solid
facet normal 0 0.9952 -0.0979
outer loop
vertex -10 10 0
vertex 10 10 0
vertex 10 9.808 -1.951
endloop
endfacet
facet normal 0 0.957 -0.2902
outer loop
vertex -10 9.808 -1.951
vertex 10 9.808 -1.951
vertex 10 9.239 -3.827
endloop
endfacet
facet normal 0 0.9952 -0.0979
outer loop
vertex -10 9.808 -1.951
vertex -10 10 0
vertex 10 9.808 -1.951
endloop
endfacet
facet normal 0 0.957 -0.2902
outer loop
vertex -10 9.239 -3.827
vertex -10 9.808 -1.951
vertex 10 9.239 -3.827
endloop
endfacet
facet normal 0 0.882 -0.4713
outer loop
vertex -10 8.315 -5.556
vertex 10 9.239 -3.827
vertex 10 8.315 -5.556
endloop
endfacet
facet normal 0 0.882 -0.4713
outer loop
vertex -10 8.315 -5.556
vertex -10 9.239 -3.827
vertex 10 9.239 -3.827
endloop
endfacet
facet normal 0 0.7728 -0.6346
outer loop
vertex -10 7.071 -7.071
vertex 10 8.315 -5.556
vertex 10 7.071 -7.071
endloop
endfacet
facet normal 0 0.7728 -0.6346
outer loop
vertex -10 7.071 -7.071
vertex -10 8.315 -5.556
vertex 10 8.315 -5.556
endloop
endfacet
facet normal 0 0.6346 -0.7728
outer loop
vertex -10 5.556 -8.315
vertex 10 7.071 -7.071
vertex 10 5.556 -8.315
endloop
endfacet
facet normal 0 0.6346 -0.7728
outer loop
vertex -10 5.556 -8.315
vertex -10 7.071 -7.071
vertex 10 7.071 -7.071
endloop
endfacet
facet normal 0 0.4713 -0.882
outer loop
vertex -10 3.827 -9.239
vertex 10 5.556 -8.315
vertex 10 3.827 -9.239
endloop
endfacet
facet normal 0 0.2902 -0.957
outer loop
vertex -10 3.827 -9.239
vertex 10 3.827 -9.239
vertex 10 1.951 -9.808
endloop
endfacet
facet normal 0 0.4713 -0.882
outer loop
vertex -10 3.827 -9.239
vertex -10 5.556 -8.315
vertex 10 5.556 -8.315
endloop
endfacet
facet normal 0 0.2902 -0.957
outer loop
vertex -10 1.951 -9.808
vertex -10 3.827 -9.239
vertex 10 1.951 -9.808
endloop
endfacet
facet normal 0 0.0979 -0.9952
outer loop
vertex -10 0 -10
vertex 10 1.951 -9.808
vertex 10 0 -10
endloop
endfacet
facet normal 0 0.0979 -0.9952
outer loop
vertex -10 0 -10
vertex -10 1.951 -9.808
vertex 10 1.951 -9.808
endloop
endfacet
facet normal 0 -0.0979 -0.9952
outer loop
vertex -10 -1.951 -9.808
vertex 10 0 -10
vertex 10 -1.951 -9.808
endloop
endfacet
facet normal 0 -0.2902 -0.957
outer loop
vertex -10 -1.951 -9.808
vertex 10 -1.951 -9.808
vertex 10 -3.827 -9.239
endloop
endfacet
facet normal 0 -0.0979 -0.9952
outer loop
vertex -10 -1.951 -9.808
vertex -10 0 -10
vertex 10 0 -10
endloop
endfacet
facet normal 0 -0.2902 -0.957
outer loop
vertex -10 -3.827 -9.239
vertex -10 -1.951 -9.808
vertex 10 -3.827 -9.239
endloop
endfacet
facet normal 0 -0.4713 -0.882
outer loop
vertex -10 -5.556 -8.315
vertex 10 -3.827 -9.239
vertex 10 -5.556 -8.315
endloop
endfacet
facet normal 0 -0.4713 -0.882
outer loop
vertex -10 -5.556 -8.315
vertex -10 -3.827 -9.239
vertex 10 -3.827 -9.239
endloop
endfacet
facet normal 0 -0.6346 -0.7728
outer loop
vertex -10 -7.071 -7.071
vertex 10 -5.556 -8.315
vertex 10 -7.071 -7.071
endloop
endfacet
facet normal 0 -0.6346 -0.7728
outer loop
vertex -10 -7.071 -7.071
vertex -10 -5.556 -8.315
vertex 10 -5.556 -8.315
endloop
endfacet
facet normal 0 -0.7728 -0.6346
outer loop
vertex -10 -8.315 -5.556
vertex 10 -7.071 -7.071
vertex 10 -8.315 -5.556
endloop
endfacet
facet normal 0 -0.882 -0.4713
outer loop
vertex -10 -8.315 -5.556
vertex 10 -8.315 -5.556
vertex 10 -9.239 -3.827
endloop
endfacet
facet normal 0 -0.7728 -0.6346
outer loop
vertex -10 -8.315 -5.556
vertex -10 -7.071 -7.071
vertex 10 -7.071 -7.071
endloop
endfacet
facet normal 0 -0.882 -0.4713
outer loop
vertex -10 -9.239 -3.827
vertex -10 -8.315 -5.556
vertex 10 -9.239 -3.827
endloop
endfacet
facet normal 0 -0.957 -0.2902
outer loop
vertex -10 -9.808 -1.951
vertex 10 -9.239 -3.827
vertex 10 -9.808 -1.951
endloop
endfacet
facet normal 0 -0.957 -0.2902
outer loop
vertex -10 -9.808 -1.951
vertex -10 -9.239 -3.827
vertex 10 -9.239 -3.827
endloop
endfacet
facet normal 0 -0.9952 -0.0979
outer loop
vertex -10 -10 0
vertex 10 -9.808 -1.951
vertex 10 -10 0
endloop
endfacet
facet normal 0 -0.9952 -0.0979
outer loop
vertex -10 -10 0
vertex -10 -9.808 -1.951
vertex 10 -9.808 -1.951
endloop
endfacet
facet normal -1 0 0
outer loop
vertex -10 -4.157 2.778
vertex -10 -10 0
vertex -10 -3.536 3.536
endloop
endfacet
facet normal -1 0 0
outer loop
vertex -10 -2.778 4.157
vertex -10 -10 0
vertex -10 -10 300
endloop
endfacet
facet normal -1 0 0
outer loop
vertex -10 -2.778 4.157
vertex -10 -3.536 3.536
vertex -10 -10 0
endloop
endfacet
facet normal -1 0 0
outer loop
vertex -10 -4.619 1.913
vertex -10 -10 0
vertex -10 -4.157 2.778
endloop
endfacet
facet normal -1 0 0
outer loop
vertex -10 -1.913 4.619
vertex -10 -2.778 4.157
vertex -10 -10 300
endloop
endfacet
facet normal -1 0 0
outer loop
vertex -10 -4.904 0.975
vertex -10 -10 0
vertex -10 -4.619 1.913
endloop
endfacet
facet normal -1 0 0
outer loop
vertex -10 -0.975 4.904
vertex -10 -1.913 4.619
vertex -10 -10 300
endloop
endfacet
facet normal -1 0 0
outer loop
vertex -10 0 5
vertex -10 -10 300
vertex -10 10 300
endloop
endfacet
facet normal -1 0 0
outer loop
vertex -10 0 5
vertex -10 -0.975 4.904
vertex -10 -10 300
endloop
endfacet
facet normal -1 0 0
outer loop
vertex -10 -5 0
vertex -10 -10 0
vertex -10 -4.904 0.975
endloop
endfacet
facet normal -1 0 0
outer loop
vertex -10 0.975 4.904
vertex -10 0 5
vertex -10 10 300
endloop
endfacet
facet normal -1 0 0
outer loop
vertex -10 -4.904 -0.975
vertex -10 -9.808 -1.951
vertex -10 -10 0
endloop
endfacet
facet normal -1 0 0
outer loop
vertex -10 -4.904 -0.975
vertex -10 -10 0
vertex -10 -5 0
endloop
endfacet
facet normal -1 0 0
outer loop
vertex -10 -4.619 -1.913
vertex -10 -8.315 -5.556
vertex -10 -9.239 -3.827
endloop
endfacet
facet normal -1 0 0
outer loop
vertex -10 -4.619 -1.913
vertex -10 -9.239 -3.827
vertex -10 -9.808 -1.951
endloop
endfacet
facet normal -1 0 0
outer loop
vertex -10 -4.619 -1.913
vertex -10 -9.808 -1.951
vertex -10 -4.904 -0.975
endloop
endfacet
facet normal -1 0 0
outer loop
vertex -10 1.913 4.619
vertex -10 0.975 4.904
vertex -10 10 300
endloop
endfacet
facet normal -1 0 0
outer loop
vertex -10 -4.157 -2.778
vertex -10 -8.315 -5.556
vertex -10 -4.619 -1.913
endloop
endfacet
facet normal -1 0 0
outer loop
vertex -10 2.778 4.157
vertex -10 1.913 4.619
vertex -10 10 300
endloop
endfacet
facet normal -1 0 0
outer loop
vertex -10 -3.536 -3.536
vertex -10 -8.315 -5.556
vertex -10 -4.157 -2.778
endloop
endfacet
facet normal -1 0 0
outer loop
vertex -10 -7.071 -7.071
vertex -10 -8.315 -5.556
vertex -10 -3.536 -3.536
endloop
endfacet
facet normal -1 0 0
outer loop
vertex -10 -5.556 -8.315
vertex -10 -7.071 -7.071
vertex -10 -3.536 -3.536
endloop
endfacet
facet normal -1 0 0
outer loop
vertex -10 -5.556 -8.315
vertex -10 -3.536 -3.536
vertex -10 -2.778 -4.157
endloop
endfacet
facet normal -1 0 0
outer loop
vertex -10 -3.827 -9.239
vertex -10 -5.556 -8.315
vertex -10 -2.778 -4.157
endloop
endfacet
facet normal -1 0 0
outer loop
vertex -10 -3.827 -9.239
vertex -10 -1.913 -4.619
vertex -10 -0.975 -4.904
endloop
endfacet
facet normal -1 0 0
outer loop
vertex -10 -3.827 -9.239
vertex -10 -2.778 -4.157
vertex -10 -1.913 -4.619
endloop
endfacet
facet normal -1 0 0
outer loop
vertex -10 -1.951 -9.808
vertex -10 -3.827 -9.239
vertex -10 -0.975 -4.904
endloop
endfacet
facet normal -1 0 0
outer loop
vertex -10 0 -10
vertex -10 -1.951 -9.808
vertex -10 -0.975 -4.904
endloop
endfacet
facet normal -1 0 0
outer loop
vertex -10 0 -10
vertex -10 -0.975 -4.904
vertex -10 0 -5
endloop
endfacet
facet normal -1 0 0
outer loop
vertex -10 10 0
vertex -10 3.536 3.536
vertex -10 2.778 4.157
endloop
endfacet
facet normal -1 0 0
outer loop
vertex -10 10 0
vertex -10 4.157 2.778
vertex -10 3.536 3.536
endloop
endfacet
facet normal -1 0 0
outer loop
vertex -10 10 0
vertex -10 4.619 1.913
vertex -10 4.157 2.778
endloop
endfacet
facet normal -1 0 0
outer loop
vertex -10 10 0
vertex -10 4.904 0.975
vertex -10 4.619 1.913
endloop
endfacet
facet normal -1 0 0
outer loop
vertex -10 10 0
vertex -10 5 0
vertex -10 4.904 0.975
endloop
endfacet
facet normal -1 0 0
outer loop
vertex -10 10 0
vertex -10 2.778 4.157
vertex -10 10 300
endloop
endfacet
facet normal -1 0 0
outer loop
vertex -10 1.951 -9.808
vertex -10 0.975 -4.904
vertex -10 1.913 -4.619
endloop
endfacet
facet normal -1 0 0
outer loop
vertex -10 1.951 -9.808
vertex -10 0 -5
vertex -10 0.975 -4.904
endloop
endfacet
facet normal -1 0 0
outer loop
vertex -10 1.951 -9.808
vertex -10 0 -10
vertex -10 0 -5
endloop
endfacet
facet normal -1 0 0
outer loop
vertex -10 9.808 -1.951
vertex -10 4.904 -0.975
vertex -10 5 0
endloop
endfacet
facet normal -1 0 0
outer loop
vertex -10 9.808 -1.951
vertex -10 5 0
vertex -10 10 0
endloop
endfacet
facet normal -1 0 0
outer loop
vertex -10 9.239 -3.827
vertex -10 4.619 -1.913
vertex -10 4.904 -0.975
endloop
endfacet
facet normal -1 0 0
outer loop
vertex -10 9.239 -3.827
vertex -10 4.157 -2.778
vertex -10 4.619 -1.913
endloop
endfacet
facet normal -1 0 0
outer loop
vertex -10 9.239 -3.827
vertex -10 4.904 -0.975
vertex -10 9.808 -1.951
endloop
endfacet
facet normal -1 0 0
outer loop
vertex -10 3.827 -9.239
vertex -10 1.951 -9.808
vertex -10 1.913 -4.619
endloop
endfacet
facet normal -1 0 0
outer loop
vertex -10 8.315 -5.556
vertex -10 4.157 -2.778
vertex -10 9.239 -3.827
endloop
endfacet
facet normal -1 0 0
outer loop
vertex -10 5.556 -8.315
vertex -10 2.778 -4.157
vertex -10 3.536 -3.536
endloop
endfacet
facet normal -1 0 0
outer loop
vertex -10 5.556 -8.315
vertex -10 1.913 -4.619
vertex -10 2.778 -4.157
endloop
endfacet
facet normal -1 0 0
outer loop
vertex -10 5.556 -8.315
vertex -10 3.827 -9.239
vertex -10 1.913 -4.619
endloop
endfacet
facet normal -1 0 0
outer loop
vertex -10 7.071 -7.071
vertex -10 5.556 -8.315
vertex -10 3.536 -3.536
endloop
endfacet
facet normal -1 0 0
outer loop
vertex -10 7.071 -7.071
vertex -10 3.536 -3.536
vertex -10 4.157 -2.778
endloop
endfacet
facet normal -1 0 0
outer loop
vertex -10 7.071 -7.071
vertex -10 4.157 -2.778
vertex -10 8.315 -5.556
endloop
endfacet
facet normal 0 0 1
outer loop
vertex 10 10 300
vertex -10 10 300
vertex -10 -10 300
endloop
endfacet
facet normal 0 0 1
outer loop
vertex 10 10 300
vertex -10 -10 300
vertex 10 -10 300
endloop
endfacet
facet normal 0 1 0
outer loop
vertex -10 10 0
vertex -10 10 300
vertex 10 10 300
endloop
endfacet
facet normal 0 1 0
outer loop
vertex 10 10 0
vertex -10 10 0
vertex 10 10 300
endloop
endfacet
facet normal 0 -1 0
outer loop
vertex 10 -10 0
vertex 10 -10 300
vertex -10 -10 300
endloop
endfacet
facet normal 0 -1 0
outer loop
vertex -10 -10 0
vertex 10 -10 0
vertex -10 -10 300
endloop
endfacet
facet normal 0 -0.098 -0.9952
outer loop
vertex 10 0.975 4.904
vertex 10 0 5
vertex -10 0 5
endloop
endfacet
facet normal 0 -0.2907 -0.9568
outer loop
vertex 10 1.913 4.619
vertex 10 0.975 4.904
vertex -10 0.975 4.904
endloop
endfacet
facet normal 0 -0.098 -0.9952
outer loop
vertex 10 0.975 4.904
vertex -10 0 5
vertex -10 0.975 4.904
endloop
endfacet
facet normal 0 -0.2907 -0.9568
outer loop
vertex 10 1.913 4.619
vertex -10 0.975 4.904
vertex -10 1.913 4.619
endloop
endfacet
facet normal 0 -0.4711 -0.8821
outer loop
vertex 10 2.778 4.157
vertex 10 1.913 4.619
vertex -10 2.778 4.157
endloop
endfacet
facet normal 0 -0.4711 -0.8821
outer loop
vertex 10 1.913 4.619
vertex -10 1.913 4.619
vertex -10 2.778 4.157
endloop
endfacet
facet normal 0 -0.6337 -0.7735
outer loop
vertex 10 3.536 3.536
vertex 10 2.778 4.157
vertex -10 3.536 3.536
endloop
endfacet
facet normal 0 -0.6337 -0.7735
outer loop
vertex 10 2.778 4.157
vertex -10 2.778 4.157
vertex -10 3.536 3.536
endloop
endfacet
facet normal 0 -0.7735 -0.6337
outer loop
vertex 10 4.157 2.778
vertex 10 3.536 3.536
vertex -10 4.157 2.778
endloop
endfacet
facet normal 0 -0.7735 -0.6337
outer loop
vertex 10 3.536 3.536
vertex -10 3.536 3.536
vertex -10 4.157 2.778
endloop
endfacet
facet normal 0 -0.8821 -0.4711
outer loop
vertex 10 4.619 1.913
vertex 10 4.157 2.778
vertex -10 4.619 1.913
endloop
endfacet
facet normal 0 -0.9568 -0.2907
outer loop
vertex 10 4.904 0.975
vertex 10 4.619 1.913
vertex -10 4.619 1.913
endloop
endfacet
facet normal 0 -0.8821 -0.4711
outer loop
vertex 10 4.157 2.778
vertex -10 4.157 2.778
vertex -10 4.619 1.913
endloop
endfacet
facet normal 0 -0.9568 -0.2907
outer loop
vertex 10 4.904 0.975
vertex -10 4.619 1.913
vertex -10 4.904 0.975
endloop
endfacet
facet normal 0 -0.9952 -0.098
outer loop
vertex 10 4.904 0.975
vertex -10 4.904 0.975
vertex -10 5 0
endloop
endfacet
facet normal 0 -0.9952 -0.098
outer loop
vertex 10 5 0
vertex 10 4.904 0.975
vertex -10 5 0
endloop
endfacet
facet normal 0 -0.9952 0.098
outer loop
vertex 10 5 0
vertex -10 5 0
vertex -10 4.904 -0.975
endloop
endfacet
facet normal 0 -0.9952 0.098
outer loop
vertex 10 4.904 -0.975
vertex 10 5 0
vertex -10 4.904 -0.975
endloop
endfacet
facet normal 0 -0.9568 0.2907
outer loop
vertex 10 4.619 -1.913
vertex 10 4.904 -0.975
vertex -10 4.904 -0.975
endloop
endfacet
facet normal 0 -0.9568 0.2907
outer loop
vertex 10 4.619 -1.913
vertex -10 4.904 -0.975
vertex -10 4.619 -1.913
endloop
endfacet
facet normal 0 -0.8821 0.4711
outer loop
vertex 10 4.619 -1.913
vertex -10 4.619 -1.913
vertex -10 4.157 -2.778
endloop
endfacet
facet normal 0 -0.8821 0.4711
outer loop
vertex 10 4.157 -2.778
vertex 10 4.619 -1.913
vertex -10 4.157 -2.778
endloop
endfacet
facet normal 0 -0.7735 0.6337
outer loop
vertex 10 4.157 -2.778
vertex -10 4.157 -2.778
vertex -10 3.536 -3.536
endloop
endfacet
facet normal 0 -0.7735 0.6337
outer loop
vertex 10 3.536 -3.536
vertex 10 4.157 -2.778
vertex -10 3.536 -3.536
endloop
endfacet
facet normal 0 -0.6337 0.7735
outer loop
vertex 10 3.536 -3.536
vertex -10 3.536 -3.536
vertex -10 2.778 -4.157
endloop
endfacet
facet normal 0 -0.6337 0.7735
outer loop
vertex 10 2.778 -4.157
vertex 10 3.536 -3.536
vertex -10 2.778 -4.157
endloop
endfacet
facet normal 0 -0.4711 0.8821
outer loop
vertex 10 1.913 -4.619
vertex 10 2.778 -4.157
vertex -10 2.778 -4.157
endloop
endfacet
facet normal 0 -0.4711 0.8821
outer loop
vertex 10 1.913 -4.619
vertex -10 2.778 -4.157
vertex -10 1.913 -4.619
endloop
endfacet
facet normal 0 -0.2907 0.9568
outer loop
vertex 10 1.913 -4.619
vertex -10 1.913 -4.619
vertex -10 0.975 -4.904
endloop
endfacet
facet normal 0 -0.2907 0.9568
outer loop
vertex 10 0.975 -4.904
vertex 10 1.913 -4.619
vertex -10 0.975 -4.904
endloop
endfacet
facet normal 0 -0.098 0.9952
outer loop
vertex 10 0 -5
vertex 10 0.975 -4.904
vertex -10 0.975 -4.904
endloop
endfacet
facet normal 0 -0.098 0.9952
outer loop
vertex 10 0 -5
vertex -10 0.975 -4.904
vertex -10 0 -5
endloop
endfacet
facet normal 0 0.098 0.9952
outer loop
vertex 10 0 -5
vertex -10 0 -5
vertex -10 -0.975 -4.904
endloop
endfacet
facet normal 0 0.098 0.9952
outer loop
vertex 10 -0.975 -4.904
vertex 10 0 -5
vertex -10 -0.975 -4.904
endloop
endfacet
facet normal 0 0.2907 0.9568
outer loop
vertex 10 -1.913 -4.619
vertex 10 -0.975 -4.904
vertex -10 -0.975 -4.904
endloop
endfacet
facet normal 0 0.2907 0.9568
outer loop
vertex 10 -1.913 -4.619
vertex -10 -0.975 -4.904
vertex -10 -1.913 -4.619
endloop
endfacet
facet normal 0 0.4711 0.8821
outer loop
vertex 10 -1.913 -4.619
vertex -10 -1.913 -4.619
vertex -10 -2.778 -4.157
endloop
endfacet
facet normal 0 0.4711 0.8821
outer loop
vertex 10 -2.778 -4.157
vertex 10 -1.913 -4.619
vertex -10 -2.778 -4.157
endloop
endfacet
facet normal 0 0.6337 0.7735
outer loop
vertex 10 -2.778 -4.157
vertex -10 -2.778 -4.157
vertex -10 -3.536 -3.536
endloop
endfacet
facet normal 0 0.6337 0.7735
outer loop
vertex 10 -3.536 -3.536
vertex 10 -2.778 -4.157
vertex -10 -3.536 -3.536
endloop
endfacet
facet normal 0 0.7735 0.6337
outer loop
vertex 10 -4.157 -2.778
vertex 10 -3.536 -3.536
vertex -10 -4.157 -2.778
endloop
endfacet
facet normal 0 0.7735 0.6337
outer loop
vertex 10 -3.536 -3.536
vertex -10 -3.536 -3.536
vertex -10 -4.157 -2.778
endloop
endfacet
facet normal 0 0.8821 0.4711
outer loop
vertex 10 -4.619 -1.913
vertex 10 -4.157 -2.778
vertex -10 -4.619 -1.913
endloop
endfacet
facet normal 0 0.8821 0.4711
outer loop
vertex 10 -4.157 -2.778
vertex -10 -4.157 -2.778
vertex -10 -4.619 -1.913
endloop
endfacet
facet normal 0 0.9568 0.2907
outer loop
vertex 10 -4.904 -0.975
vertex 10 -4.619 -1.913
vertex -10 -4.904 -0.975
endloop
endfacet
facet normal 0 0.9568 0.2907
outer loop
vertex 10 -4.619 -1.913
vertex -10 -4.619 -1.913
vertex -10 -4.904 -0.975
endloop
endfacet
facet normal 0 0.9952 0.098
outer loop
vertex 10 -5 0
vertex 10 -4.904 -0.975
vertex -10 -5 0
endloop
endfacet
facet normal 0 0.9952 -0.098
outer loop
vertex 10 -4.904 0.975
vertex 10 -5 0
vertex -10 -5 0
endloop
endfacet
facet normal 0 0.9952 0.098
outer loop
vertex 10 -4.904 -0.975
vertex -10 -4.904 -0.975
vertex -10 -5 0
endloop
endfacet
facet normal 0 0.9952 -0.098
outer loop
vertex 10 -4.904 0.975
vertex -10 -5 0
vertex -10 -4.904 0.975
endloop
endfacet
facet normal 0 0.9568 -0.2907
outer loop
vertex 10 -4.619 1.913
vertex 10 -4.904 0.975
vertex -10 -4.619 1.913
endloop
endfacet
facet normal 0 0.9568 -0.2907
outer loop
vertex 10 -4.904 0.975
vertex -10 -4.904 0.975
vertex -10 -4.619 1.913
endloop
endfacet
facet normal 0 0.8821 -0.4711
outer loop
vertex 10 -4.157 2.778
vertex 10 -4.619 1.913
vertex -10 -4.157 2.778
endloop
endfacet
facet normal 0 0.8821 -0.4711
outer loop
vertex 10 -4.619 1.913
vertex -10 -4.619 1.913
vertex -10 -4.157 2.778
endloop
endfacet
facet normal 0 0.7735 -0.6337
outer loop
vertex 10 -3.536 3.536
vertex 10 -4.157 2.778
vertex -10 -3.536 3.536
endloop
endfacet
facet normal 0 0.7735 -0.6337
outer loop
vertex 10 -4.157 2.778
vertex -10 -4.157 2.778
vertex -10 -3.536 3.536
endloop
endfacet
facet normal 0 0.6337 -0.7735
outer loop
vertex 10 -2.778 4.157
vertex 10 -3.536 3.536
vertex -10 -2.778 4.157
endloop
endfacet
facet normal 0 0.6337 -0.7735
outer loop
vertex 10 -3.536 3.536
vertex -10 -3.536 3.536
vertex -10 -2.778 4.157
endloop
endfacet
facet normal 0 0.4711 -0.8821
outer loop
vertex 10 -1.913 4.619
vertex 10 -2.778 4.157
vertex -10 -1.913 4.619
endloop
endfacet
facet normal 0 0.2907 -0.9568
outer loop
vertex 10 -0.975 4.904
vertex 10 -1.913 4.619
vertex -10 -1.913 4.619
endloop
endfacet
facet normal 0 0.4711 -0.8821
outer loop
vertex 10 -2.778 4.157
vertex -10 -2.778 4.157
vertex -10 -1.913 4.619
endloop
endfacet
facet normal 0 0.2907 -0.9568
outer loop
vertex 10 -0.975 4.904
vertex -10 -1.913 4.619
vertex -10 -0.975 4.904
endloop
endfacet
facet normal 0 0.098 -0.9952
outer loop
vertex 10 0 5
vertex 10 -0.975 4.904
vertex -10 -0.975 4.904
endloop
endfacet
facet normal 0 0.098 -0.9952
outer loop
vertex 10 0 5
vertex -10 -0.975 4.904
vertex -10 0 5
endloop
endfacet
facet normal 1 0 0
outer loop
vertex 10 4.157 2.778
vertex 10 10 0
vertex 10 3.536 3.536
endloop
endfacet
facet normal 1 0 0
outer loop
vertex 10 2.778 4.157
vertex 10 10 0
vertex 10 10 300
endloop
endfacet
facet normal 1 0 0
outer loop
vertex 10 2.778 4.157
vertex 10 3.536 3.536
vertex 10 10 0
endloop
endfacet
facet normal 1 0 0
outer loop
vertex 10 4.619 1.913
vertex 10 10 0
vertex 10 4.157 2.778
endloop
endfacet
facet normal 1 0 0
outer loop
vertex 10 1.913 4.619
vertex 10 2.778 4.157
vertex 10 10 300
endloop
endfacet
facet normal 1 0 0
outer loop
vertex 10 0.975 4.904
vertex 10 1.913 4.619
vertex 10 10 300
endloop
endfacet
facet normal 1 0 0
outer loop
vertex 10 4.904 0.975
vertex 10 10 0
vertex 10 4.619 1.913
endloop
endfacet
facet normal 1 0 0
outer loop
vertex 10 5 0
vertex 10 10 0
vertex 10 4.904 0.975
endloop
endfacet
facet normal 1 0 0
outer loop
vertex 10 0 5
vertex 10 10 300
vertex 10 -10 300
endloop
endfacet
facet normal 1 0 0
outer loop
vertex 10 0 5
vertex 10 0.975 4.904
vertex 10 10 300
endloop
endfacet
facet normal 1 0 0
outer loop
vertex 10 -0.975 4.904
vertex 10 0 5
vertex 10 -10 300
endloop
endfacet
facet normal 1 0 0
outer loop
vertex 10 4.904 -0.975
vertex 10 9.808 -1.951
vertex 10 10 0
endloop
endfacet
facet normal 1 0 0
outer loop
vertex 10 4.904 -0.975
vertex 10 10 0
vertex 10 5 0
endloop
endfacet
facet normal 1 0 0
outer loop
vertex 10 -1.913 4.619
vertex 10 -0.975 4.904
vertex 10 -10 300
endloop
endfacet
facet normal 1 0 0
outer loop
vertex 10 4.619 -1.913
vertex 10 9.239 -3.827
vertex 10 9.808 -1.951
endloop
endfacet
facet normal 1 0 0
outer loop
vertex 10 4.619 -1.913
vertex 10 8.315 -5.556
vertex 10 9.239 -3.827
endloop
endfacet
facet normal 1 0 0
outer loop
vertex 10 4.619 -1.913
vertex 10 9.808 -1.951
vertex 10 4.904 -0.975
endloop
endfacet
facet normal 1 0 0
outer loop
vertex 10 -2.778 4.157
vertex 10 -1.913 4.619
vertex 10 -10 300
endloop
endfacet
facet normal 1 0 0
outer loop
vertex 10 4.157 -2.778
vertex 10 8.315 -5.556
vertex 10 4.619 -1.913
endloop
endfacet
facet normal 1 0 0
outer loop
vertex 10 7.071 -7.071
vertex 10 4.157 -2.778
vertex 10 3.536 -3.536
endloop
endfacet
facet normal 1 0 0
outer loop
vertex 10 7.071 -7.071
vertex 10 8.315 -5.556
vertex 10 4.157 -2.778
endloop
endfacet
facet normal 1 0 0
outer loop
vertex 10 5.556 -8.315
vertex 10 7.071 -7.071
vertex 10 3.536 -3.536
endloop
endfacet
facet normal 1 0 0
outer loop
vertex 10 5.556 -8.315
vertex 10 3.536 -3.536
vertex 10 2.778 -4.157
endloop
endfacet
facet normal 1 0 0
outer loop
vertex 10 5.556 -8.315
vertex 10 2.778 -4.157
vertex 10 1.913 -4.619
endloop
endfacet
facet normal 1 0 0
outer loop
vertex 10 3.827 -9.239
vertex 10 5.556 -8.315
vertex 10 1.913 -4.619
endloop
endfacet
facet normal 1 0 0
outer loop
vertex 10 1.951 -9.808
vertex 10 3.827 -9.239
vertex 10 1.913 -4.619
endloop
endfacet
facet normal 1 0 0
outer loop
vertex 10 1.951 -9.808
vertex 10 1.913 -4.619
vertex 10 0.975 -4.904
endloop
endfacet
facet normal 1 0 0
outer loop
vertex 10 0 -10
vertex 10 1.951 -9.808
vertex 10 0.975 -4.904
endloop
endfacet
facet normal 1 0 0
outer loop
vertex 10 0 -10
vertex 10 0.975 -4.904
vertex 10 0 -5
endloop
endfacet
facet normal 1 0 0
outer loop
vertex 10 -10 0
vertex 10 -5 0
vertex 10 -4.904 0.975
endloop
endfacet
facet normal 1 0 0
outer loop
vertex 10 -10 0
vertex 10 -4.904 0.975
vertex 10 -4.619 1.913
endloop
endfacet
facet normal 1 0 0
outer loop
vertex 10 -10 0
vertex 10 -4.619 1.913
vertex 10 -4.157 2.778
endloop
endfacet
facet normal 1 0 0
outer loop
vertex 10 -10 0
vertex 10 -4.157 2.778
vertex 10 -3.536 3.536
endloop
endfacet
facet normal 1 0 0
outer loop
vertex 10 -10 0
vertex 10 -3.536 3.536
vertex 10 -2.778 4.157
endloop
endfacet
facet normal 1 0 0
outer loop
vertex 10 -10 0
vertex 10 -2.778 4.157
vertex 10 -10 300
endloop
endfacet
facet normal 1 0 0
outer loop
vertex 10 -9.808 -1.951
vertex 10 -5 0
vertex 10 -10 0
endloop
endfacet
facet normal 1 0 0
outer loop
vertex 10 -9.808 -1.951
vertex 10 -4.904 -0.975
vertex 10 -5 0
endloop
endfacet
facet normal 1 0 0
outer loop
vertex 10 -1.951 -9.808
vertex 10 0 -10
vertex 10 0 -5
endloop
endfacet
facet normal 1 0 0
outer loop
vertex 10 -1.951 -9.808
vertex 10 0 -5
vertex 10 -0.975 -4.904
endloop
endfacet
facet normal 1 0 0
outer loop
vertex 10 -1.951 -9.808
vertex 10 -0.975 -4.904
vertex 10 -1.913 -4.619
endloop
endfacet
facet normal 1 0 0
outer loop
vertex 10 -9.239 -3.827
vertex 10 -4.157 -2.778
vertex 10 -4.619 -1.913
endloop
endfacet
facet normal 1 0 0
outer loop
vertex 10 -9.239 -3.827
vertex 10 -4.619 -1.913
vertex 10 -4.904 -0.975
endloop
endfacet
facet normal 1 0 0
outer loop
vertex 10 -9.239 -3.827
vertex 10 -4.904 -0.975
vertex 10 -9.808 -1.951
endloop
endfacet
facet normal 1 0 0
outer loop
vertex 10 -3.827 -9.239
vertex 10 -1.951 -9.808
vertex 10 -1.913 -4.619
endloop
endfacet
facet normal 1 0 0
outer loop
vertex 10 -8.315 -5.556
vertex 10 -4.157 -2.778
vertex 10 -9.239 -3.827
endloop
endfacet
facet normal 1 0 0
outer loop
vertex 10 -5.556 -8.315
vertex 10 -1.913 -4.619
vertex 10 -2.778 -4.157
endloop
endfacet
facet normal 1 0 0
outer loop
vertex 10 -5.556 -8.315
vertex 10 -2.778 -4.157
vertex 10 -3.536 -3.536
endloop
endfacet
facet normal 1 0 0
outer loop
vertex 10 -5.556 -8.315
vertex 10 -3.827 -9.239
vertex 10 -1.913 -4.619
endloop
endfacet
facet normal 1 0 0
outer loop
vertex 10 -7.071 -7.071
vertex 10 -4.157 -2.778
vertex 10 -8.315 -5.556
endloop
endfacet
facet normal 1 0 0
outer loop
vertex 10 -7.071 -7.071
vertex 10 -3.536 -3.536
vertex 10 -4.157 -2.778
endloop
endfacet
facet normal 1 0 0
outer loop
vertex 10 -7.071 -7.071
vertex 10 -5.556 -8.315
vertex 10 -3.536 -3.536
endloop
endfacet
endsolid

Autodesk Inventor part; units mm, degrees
ref_plane "YZ Plane" through (0, 0, 0) normal (1, 0, 0) x (0, 1, 0)
ref_plane "XZ Plane" through (0, 0, 0) normal (0, 1, 0) x (-1, 0, 0)
ref_plane "XY Plane" through (0, 0, 0) normal (0, 0, 1) x (1, 0, 0)
sketch "Sketch1" plane through (0, 0, 0) normal (0, 0, 1) x (1, 0, 0)
  line L0 (-10, 10) -> (10, 10)
  line L1 (10, 10) -> (10, -10)
  line L2 (10, -10) -> (-10, -10)
  line L3 (-10, -10) -> (-10, 10)
  point P0 (0, 0)
  dimension "d0" = 20
  dimension "d1" = 20
  dimension "d2" = 10
  dimension "d3" = 10
extrude "Extrusion1" add sketch "Sketch1" along normal blind 300
sketch "Sketch2" plane through (-10, -10, 0) normal (-1, 0, 0) x (0, 0, 1)
  line L0 (0, 0) -> (0, 20) projected
  arc A0 (0, 20) -> (0, 0) centre (0, 10) ccw
extrude "Extrusion2" add sketch "Sketch2" against normal up to surface (20 mm away)
sketch "Sketch3" plane through (-10, -10, 300) normal (-1, 0, 0) x (0, 0, 1)
  circle A0 centre (-300, 10) radius 5
  dimension "d8" = 10
extrude "Extrusion3" cut sketch "Sketch3" against normal blind 30
properties part number "prismaticLink" material "Stainless Steel"
